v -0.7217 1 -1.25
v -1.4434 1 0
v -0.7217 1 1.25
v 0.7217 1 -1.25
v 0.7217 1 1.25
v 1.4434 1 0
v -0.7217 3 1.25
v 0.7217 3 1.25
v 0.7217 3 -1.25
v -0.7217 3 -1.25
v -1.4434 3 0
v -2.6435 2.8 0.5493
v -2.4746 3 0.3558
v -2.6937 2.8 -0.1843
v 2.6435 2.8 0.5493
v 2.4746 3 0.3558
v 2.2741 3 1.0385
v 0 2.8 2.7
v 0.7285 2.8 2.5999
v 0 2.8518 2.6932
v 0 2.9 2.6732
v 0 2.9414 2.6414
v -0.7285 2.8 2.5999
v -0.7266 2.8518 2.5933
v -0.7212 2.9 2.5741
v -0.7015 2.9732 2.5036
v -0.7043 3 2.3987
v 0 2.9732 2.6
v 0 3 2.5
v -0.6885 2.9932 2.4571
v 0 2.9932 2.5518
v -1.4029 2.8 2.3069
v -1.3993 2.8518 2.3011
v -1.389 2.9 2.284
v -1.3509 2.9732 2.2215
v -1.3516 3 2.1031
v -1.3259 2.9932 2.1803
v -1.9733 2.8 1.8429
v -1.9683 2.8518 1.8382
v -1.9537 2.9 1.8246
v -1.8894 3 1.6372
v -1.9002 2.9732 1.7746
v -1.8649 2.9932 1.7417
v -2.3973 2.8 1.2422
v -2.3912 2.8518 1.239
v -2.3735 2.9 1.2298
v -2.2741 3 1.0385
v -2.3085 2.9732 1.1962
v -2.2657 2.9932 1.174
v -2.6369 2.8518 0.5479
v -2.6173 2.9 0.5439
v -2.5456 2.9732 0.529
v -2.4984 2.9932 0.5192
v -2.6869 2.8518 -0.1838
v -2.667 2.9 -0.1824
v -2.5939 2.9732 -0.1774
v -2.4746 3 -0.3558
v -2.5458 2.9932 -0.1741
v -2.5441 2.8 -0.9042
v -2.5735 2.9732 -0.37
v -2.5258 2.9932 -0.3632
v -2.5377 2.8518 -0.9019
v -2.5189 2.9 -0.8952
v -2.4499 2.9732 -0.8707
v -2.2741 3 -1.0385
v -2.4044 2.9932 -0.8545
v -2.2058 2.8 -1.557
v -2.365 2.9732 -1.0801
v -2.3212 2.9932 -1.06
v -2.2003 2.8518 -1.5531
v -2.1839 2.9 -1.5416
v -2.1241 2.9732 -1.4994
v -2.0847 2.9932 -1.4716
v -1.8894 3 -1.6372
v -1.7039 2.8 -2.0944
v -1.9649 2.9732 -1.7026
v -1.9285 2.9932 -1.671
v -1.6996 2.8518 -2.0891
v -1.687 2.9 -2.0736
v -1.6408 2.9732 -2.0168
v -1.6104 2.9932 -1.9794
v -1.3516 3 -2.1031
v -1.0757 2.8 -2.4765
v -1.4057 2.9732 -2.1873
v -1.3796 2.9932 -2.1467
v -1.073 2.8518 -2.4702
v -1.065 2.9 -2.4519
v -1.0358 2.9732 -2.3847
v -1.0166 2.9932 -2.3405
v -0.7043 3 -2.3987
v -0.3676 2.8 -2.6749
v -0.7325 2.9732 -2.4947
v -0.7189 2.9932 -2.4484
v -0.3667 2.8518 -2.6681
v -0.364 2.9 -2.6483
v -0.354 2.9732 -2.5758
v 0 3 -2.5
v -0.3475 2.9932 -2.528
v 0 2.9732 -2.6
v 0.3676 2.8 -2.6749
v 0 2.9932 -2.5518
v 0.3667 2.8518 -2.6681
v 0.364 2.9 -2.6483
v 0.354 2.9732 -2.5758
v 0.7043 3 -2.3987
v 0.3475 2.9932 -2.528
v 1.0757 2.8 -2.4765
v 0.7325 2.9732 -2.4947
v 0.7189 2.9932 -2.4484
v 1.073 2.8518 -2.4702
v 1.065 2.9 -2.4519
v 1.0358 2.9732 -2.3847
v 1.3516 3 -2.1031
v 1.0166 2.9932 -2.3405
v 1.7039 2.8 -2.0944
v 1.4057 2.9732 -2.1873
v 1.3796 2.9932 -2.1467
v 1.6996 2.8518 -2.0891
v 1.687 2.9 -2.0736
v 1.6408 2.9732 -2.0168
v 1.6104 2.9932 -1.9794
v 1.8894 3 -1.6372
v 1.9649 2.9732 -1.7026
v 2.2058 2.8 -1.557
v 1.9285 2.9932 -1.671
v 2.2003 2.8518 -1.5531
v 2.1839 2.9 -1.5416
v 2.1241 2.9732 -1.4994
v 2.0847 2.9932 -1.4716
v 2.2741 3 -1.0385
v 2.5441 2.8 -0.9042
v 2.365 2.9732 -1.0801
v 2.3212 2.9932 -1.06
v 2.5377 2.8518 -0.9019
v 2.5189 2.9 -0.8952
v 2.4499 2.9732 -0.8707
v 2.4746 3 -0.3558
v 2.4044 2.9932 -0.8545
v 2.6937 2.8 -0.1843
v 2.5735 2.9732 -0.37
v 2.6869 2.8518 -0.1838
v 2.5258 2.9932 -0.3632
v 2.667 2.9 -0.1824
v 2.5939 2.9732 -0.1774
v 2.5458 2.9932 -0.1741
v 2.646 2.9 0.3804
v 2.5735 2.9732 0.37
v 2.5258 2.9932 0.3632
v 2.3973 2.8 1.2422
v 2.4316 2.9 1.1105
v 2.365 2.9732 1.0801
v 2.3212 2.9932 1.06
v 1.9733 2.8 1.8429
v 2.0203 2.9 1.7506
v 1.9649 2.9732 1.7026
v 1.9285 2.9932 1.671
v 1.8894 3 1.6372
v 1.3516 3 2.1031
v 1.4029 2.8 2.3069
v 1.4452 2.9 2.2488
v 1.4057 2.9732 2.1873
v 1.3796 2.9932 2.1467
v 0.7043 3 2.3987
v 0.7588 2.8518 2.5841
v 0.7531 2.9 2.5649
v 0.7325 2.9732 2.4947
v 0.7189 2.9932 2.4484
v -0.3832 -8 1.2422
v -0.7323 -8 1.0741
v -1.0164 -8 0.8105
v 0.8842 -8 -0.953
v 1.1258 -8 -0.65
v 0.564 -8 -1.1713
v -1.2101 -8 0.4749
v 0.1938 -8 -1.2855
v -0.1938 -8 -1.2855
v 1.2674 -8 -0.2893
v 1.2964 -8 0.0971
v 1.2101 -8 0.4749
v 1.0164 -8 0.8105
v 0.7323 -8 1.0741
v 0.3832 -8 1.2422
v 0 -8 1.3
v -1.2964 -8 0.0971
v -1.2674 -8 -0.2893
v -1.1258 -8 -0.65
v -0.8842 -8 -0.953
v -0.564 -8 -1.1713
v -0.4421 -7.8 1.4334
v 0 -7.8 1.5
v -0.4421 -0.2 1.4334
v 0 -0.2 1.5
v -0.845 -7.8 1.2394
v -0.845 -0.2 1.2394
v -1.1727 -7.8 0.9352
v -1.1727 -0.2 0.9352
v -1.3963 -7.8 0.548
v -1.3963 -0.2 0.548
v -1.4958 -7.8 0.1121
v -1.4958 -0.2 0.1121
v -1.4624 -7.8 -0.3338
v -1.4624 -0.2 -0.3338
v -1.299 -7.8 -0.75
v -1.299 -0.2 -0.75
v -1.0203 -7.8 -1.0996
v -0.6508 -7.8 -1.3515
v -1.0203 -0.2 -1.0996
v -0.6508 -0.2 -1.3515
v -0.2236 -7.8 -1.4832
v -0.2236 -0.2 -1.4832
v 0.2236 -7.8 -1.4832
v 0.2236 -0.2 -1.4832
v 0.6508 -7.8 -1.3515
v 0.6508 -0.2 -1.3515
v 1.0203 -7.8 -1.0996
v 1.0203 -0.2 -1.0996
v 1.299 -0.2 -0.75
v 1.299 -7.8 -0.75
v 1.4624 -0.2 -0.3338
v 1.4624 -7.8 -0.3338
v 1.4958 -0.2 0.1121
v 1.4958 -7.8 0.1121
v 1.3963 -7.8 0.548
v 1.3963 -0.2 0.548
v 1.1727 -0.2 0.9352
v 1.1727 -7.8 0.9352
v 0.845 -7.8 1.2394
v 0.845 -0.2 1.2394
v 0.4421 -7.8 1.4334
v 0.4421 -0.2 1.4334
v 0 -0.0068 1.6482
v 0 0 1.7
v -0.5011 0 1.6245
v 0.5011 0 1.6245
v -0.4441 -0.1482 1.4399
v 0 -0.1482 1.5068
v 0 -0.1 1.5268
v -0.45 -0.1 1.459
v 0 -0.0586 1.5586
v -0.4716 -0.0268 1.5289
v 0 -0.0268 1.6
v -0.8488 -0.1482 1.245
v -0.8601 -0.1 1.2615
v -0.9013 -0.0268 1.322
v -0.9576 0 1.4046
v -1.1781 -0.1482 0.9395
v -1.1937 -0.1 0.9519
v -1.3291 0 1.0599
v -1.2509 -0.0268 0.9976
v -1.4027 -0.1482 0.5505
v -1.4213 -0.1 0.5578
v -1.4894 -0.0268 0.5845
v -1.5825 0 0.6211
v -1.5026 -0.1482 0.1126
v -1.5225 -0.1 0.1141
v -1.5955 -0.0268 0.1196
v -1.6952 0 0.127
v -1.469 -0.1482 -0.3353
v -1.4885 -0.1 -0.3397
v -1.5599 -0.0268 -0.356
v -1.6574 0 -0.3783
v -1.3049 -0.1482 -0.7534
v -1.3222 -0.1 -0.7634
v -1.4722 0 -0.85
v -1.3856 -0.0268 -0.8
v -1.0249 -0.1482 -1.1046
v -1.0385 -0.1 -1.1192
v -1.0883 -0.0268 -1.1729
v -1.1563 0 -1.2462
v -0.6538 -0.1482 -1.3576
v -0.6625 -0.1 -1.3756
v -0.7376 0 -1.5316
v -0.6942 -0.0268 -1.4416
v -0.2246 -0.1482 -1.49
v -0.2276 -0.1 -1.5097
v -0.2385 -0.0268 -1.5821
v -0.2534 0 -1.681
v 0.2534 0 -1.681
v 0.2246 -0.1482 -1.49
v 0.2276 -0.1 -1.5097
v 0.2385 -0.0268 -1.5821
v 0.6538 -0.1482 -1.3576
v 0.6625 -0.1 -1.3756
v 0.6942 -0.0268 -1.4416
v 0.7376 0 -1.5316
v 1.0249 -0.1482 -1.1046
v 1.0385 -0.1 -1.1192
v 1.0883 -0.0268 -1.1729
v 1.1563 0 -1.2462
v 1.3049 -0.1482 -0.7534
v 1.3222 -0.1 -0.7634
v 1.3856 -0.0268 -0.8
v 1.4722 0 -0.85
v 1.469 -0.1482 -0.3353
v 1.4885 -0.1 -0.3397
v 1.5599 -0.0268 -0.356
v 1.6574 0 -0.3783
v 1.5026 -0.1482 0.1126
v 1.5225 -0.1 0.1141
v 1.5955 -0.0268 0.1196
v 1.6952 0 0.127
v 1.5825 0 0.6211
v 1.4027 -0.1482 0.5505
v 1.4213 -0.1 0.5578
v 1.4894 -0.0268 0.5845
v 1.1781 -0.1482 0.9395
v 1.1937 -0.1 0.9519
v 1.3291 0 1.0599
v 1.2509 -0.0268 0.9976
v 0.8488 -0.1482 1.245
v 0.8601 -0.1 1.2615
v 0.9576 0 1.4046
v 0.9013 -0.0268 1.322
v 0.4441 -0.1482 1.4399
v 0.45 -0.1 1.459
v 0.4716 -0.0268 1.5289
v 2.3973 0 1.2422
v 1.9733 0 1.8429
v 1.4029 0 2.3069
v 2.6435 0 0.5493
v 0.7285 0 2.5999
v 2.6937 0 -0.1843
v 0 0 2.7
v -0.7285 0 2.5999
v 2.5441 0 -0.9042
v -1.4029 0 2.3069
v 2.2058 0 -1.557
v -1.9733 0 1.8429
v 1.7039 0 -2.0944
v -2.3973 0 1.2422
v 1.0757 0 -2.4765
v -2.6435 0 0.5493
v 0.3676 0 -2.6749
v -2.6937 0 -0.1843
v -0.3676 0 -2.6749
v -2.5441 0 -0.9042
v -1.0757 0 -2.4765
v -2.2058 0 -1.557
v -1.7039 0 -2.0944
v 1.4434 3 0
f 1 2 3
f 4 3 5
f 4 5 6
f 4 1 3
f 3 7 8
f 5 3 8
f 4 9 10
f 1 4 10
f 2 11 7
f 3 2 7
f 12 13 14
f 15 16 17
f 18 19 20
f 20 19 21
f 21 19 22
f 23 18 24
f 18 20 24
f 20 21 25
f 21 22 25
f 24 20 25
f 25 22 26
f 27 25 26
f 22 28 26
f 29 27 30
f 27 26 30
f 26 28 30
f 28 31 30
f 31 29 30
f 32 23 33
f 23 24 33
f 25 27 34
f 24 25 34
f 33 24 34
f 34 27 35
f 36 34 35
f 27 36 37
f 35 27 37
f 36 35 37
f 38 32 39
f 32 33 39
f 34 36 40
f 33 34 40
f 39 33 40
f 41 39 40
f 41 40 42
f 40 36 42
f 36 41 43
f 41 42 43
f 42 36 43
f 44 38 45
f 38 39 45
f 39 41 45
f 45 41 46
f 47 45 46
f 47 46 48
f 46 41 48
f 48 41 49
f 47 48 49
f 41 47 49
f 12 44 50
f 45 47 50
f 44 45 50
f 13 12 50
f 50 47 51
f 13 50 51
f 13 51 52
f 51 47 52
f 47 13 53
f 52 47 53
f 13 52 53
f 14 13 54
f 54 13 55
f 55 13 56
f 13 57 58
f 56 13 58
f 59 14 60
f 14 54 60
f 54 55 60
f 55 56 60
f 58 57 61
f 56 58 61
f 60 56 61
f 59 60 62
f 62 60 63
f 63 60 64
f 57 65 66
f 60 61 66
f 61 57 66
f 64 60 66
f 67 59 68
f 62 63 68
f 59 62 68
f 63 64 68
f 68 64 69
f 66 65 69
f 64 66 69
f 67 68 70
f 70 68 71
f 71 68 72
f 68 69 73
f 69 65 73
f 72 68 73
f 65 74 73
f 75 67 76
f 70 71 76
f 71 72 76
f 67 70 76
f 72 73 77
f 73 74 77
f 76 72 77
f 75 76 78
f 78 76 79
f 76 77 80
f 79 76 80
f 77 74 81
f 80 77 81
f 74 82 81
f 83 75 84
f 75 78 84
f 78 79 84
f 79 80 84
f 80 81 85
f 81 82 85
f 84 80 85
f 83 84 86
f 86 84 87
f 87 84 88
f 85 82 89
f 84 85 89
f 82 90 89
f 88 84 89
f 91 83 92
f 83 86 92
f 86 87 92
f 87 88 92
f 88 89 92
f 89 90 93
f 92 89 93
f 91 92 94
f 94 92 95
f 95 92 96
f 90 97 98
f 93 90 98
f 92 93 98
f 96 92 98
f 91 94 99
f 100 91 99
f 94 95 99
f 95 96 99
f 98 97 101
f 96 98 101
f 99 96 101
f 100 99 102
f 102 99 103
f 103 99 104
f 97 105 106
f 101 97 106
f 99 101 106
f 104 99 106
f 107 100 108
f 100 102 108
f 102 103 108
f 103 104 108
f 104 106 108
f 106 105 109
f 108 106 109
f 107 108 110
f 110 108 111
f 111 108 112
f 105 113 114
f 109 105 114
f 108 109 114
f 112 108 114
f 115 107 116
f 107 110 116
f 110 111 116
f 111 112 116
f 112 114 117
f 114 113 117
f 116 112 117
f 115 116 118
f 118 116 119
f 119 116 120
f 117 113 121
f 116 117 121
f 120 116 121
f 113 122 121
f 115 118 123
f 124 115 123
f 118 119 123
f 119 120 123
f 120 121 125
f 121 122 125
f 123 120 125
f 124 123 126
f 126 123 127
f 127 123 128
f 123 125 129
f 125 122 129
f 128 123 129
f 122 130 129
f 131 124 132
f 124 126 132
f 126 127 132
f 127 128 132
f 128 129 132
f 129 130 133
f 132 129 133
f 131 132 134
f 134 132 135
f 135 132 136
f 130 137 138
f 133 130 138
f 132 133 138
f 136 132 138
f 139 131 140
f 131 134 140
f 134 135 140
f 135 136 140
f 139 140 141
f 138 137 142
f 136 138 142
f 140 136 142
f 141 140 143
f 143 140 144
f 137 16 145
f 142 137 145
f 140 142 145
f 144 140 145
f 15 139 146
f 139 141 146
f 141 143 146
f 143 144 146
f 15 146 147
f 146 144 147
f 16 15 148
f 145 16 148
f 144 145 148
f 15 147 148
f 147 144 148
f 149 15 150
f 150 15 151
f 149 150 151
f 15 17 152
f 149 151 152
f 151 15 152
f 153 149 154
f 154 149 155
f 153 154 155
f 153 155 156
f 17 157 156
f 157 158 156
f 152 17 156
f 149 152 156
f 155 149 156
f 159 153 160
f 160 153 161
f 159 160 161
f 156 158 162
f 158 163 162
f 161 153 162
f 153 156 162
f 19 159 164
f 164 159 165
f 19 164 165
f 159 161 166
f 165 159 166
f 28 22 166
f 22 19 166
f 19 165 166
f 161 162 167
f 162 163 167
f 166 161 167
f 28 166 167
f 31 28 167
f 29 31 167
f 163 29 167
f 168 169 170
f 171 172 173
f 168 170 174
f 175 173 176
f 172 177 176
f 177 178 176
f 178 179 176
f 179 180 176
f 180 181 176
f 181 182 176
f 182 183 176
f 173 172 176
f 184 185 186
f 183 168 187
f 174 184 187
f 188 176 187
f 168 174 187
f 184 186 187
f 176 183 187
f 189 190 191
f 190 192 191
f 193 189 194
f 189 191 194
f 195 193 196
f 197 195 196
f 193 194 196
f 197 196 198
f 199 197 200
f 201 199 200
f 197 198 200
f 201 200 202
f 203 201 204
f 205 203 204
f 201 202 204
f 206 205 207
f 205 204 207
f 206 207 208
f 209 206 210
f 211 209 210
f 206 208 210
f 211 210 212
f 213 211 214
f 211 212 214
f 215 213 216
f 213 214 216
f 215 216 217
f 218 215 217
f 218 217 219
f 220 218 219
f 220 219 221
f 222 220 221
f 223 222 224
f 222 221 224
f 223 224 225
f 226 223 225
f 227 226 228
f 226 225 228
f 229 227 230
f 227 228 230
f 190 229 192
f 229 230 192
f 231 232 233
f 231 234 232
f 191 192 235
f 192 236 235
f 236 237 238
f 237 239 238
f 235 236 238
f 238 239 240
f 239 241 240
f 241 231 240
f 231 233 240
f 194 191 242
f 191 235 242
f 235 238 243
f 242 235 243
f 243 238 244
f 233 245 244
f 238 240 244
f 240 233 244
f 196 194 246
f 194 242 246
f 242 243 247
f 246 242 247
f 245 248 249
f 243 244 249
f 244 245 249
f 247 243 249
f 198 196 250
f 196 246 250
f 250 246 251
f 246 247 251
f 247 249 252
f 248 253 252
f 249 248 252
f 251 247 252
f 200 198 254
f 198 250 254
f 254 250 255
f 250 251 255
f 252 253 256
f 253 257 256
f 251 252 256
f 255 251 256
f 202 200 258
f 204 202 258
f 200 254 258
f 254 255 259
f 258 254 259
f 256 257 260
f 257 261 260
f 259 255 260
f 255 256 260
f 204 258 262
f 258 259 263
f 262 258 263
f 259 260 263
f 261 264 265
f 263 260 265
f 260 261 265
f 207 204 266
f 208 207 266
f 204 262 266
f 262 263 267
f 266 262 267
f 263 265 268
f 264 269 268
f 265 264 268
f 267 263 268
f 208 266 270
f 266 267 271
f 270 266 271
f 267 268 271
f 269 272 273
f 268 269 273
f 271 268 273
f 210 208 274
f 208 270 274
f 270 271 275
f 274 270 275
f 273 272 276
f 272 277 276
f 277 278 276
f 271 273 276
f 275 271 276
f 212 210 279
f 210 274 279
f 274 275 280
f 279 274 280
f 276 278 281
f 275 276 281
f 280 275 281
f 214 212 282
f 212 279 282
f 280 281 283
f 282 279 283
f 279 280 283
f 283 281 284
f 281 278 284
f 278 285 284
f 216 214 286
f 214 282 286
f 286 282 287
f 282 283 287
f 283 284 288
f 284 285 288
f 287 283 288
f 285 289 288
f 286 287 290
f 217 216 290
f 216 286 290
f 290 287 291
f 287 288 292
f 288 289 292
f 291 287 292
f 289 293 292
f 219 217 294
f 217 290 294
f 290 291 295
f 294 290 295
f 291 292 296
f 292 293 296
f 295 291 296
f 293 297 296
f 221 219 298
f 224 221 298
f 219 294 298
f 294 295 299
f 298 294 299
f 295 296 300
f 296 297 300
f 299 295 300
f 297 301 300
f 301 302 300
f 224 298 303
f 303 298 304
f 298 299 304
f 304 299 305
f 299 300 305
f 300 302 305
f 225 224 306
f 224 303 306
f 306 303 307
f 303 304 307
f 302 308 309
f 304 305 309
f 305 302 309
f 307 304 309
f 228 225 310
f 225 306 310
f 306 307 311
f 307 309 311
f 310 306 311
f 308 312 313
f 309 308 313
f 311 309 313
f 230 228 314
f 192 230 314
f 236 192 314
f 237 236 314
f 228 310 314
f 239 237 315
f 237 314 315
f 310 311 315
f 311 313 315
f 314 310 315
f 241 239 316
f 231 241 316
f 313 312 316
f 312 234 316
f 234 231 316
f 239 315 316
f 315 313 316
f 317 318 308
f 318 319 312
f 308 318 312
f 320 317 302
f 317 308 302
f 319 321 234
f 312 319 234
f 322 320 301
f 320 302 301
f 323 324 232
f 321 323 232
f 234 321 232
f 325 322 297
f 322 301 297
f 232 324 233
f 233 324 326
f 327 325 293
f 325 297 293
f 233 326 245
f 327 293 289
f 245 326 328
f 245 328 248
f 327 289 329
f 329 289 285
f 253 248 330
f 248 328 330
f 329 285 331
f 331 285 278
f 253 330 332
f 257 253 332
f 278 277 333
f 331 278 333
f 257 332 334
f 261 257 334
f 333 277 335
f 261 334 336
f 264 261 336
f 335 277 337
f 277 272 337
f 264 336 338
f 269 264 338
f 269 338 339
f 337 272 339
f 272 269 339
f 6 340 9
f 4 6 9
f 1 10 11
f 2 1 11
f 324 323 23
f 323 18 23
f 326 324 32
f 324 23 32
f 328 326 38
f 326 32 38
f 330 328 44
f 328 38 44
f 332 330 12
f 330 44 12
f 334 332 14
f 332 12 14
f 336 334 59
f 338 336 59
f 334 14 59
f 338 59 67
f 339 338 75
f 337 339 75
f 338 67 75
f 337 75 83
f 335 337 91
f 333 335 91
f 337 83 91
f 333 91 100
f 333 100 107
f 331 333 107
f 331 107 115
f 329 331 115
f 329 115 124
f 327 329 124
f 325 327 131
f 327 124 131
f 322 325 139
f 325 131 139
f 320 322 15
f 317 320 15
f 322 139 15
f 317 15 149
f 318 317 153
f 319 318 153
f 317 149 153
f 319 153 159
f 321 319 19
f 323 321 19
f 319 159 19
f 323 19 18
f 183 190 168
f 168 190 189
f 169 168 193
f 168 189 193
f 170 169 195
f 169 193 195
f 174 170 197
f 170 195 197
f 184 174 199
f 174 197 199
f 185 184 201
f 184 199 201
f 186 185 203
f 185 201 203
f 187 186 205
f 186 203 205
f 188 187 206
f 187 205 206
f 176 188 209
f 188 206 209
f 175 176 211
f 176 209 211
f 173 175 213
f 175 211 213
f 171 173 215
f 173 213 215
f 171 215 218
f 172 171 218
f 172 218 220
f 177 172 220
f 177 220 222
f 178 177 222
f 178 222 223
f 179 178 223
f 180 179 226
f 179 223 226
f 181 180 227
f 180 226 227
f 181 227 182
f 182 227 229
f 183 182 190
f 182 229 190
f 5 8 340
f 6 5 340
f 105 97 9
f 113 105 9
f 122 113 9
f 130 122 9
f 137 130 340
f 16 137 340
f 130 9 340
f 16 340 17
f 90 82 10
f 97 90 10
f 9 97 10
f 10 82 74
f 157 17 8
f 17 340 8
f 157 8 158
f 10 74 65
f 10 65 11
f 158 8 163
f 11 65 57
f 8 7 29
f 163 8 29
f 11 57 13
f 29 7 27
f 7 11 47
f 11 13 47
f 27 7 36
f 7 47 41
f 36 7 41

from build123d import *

# Parameters (mm, degrees)
CUT_EXTRUDE1_DEPTH = 2


with BuildPart() as part:
    # Sketch1 → Revolve1 (revolve)
    with BuildSketch(Plane(origin=(0, 0, 0), x_dir=(0, 0, -1), z_dir=(1, 0, 0)), mode=Mode.PRIVATE) as revolve1_sk:
        with BuildLine():
            Line((0, 3), (0, -8))
            Line((0, -8), (1.3, -8))
            Line((1.3, -8), (1.5, -7.8))
            Line((1.5, -7.8), (1.5, -0.2))
            ThreePointArc((1.5, -0.2), (1.558578644, -0.058578644), (1.7, 0))
            Line((1.7, 0), (2.7, 0))
            Line((2.7, 0), (2.7, 2.8))
            ThreePointArc((2.7, 2.8), (2.641421356, 2.941421356), (2.5, 3))
            Line((2.5, 3), (0, 3))
        make_face()
    revolve(revolve1_sk.sketch.rotate(Axis((0, 11.82745098, 0), (0, -1, 0)), 180), axis=Axis((0, 11.82745098, 0), (0, -1, 0)))

    # Sketch2 → Cut-Extrude1 (cut)
    with BuildSketch(Plane(origin=(0, 3, 0), x_dir=(1, 0, 0), z_dir=(0, 1, 0))):
        Polygon((0.721687836, 1.25), (-0.721687836, 1.25), (-1.443375673, 0), (-0.721687836, -1.25), (0.721687836, -1.25), (1.443375673, 0), align=None)
    extrude(amount=-CUT_EXTRUDE1_DEPTH, mode=Mode.SUBTRACT)


solid = part.part
